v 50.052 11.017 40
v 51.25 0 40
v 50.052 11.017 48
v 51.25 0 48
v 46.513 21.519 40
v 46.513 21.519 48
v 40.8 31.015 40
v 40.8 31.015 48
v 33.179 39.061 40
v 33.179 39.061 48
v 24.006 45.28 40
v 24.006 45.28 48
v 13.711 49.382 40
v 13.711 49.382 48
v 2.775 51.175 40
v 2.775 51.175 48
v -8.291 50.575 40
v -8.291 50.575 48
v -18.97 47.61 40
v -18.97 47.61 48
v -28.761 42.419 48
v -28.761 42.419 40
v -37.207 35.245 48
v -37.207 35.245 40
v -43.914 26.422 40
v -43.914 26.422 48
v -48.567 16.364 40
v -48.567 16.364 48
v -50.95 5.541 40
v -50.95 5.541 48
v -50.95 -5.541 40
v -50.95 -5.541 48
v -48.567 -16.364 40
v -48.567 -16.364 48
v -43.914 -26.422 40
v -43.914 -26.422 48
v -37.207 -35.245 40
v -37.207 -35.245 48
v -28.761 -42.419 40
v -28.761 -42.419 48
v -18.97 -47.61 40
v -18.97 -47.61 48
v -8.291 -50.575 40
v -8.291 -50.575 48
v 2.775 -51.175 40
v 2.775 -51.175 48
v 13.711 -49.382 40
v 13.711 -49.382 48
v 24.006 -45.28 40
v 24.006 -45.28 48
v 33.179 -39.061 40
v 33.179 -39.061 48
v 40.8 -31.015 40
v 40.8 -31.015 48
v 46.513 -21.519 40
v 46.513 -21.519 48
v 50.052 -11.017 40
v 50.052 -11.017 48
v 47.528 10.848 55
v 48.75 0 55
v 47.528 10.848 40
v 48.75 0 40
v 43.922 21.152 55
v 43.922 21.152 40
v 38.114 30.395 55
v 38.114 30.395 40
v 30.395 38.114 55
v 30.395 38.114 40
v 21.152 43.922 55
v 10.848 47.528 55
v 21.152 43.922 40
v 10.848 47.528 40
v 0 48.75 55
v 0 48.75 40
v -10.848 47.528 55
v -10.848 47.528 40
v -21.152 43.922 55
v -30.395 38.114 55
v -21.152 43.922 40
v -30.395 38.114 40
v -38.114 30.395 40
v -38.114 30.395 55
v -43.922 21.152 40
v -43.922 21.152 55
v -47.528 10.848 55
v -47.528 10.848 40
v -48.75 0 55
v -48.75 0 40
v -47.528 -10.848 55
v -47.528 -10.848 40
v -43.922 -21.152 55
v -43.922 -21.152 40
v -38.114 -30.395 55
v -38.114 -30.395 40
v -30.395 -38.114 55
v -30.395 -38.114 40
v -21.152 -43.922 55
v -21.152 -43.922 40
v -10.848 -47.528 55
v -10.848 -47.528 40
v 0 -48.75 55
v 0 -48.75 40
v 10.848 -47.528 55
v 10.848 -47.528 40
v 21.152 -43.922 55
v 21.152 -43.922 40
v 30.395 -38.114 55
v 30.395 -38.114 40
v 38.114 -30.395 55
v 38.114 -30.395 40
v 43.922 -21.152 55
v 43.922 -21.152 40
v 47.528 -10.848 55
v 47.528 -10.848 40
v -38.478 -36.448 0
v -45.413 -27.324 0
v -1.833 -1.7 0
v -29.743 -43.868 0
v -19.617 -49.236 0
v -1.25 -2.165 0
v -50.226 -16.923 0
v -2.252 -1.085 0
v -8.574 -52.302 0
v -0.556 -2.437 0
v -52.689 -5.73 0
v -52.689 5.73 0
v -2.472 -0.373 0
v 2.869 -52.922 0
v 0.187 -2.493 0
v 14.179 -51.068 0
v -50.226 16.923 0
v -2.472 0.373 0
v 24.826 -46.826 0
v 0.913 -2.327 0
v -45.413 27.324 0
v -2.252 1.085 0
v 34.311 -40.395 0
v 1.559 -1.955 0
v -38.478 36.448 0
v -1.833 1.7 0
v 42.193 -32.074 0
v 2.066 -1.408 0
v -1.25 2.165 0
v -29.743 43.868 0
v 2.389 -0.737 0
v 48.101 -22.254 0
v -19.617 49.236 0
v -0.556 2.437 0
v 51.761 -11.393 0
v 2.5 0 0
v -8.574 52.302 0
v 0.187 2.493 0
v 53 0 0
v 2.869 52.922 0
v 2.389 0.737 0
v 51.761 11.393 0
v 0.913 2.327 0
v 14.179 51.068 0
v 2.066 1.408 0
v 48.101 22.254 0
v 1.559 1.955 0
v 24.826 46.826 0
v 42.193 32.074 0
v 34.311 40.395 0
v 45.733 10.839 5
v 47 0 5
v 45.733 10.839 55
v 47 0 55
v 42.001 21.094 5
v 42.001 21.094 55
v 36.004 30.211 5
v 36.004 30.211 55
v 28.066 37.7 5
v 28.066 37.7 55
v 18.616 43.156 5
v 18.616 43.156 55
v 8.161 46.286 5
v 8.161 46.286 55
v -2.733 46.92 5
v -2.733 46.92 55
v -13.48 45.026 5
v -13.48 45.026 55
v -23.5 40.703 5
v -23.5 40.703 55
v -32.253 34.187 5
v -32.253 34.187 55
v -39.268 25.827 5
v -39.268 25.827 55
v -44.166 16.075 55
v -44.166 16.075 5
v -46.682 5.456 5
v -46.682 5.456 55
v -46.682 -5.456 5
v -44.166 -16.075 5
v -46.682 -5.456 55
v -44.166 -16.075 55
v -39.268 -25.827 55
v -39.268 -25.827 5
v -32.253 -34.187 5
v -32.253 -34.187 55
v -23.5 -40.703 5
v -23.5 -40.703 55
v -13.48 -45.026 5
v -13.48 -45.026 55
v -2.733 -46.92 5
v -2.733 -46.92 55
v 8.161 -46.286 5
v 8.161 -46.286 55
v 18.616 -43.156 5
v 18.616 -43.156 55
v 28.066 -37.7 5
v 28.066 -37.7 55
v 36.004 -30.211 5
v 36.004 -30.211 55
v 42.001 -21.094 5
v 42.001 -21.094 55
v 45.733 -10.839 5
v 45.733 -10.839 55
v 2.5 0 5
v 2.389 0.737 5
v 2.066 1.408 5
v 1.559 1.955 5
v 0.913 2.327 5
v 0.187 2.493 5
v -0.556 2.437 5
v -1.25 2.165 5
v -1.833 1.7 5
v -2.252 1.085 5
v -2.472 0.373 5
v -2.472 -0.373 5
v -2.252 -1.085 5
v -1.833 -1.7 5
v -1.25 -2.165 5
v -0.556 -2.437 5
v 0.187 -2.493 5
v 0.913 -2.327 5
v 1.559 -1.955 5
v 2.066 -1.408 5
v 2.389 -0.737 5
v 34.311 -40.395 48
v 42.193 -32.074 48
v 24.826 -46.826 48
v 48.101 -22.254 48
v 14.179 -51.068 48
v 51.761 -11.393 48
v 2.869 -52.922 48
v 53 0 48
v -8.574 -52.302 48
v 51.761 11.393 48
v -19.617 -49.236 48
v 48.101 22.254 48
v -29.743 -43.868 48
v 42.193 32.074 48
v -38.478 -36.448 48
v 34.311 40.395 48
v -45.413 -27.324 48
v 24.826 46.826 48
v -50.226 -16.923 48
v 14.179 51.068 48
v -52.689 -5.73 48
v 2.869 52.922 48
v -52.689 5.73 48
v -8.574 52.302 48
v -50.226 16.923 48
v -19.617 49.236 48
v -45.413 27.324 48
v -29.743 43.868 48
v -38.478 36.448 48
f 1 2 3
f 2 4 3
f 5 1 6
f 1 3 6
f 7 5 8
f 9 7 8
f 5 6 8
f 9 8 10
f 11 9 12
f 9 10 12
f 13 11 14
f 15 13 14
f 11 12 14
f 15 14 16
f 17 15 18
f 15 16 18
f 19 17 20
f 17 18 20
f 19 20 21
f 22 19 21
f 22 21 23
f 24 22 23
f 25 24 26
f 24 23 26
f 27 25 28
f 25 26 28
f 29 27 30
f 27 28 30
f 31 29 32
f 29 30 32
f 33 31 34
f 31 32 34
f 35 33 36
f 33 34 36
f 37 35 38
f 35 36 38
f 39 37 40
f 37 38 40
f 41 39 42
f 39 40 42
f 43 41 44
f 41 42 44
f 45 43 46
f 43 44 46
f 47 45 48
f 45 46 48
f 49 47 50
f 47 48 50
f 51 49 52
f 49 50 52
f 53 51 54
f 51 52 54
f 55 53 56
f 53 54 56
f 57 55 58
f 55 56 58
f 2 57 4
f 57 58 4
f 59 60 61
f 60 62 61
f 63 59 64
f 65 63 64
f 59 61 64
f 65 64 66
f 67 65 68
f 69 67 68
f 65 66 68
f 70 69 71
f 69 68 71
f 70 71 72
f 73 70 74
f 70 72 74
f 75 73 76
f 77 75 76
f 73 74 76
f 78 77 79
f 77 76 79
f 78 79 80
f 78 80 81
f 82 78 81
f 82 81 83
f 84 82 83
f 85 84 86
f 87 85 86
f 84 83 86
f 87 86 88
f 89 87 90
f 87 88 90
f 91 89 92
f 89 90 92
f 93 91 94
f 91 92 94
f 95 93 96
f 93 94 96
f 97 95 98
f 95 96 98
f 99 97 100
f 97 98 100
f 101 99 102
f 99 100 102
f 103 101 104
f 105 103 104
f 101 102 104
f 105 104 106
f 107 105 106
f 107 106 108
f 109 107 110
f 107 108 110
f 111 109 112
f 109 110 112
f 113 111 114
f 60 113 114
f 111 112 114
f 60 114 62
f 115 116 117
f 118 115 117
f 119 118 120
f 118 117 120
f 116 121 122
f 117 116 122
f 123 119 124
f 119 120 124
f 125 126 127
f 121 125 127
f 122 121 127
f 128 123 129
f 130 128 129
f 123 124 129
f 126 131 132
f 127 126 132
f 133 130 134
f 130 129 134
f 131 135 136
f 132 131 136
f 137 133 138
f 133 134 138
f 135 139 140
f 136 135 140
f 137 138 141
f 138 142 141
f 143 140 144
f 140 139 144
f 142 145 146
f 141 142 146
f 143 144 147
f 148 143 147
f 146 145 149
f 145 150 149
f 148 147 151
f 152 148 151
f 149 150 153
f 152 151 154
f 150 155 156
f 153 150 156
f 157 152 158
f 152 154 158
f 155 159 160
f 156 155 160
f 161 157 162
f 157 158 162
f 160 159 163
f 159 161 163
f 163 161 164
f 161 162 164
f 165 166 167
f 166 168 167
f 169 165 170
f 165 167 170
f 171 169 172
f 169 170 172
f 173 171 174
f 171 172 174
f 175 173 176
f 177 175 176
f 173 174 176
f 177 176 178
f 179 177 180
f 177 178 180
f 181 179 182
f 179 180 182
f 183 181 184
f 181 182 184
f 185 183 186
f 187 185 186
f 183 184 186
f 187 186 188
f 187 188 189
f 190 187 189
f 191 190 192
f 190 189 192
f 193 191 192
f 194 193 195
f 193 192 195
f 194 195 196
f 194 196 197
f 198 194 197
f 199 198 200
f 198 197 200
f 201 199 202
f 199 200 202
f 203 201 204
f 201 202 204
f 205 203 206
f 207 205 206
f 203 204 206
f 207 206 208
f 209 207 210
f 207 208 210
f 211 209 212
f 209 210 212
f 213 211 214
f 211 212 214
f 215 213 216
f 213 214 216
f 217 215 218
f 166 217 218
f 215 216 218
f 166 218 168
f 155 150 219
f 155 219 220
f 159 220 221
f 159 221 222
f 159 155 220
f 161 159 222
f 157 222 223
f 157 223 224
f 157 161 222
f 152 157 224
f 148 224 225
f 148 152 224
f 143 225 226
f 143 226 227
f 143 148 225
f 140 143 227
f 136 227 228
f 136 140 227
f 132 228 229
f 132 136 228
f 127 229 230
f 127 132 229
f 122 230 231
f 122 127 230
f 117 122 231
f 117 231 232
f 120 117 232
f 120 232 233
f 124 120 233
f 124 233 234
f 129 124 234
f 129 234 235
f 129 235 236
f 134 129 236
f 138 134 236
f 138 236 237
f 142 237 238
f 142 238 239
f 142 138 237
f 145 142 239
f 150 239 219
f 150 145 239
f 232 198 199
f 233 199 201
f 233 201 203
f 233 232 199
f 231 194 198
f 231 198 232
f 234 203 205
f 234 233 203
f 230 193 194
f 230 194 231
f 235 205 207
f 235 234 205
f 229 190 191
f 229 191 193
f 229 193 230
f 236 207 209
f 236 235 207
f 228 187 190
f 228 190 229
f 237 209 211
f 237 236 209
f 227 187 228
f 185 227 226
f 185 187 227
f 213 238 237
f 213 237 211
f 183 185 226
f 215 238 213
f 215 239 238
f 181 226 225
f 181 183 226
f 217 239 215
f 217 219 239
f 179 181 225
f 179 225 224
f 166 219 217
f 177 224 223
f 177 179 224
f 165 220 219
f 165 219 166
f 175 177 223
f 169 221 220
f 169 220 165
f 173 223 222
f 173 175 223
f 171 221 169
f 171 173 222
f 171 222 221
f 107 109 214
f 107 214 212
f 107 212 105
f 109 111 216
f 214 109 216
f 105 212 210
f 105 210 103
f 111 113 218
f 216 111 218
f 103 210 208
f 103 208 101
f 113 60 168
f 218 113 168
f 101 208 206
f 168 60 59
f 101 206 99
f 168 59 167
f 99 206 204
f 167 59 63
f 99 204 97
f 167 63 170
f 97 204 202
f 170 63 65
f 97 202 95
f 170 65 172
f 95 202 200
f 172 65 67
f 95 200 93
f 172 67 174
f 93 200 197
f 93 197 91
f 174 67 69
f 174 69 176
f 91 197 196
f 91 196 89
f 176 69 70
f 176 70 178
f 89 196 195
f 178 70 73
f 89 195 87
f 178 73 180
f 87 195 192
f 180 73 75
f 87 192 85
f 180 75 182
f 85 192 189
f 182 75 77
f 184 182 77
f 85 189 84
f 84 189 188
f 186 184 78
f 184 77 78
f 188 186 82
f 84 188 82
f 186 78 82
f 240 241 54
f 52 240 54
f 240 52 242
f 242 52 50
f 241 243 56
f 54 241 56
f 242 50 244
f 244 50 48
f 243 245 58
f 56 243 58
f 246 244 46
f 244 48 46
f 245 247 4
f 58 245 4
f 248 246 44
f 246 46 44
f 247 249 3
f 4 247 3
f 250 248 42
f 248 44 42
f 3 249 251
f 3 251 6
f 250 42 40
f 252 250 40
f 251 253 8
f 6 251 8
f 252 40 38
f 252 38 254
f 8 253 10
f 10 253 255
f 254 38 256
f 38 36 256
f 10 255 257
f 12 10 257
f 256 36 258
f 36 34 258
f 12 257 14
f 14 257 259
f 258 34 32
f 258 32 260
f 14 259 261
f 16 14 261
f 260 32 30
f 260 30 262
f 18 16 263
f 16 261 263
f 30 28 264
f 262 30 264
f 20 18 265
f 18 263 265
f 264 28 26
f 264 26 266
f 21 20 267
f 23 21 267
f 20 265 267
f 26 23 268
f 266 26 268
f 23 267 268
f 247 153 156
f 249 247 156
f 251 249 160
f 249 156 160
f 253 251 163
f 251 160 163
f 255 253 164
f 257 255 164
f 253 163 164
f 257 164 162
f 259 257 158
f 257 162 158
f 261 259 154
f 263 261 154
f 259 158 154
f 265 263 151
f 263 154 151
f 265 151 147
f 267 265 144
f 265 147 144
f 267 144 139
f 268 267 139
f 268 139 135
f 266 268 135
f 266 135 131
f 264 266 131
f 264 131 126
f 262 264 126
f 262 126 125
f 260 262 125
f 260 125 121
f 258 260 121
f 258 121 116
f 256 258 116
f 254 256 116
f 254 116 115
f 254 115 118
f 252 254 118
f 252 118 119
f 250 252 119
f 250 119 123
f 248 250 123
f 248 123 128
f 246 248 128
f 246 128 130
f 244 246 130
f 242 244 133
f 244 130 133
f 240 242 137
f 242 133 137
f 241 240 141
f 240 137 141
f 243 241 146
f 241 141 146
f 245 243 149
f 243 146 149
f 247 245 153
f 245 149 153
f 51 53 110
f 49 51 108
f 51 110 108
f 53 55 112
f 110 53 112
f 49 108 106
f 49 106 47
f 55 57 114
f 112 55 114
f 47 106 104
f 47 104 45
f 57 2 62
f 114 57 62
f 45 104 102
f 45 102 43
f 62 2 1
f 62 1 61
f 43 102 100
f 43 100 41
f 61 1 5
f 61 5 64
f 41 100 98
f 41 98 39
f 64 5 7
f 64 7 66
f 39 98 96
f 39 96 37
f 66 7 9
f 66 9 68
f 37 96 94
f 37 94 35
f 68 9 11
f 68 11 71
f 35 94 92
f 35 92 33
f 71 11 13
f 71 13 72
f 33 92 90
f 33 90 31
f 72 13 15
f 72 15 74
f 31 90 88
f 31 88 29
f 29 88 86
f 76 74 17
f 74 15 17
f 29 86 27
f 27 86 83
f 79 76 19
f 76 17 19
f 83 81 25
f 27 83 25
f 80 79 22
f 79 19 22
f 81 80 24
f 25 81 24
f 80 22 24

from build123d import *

# Parameters (mm, degrees)
SKETCH_R   = 53
SKETCH_R_2 = 2.5
PAD_DEPTH  = 5


with BuildPart() as part:
    # Sketch → Pad (new body)
    with BuildSketch(Plane.XY):
        Circle(SKETCH_R)
        Circle(SKETCH_R_2, mode=Mode.SUBTRACT)
    extrude(amount=PAD_DEPTH)

    # Sketch001 → Revolution (revolve)
    with BuildSketch(Plane.XZ):
        Polygon((53, 5), (47, 5), (47, 55), (48.75, 55), (48.75, 40), (51.25, 40), (51.25, 48), (53, 48), align=None)
    revolve(axis=Axis((0, 0, 0), (0, 0, 1)))


solid = part.part
